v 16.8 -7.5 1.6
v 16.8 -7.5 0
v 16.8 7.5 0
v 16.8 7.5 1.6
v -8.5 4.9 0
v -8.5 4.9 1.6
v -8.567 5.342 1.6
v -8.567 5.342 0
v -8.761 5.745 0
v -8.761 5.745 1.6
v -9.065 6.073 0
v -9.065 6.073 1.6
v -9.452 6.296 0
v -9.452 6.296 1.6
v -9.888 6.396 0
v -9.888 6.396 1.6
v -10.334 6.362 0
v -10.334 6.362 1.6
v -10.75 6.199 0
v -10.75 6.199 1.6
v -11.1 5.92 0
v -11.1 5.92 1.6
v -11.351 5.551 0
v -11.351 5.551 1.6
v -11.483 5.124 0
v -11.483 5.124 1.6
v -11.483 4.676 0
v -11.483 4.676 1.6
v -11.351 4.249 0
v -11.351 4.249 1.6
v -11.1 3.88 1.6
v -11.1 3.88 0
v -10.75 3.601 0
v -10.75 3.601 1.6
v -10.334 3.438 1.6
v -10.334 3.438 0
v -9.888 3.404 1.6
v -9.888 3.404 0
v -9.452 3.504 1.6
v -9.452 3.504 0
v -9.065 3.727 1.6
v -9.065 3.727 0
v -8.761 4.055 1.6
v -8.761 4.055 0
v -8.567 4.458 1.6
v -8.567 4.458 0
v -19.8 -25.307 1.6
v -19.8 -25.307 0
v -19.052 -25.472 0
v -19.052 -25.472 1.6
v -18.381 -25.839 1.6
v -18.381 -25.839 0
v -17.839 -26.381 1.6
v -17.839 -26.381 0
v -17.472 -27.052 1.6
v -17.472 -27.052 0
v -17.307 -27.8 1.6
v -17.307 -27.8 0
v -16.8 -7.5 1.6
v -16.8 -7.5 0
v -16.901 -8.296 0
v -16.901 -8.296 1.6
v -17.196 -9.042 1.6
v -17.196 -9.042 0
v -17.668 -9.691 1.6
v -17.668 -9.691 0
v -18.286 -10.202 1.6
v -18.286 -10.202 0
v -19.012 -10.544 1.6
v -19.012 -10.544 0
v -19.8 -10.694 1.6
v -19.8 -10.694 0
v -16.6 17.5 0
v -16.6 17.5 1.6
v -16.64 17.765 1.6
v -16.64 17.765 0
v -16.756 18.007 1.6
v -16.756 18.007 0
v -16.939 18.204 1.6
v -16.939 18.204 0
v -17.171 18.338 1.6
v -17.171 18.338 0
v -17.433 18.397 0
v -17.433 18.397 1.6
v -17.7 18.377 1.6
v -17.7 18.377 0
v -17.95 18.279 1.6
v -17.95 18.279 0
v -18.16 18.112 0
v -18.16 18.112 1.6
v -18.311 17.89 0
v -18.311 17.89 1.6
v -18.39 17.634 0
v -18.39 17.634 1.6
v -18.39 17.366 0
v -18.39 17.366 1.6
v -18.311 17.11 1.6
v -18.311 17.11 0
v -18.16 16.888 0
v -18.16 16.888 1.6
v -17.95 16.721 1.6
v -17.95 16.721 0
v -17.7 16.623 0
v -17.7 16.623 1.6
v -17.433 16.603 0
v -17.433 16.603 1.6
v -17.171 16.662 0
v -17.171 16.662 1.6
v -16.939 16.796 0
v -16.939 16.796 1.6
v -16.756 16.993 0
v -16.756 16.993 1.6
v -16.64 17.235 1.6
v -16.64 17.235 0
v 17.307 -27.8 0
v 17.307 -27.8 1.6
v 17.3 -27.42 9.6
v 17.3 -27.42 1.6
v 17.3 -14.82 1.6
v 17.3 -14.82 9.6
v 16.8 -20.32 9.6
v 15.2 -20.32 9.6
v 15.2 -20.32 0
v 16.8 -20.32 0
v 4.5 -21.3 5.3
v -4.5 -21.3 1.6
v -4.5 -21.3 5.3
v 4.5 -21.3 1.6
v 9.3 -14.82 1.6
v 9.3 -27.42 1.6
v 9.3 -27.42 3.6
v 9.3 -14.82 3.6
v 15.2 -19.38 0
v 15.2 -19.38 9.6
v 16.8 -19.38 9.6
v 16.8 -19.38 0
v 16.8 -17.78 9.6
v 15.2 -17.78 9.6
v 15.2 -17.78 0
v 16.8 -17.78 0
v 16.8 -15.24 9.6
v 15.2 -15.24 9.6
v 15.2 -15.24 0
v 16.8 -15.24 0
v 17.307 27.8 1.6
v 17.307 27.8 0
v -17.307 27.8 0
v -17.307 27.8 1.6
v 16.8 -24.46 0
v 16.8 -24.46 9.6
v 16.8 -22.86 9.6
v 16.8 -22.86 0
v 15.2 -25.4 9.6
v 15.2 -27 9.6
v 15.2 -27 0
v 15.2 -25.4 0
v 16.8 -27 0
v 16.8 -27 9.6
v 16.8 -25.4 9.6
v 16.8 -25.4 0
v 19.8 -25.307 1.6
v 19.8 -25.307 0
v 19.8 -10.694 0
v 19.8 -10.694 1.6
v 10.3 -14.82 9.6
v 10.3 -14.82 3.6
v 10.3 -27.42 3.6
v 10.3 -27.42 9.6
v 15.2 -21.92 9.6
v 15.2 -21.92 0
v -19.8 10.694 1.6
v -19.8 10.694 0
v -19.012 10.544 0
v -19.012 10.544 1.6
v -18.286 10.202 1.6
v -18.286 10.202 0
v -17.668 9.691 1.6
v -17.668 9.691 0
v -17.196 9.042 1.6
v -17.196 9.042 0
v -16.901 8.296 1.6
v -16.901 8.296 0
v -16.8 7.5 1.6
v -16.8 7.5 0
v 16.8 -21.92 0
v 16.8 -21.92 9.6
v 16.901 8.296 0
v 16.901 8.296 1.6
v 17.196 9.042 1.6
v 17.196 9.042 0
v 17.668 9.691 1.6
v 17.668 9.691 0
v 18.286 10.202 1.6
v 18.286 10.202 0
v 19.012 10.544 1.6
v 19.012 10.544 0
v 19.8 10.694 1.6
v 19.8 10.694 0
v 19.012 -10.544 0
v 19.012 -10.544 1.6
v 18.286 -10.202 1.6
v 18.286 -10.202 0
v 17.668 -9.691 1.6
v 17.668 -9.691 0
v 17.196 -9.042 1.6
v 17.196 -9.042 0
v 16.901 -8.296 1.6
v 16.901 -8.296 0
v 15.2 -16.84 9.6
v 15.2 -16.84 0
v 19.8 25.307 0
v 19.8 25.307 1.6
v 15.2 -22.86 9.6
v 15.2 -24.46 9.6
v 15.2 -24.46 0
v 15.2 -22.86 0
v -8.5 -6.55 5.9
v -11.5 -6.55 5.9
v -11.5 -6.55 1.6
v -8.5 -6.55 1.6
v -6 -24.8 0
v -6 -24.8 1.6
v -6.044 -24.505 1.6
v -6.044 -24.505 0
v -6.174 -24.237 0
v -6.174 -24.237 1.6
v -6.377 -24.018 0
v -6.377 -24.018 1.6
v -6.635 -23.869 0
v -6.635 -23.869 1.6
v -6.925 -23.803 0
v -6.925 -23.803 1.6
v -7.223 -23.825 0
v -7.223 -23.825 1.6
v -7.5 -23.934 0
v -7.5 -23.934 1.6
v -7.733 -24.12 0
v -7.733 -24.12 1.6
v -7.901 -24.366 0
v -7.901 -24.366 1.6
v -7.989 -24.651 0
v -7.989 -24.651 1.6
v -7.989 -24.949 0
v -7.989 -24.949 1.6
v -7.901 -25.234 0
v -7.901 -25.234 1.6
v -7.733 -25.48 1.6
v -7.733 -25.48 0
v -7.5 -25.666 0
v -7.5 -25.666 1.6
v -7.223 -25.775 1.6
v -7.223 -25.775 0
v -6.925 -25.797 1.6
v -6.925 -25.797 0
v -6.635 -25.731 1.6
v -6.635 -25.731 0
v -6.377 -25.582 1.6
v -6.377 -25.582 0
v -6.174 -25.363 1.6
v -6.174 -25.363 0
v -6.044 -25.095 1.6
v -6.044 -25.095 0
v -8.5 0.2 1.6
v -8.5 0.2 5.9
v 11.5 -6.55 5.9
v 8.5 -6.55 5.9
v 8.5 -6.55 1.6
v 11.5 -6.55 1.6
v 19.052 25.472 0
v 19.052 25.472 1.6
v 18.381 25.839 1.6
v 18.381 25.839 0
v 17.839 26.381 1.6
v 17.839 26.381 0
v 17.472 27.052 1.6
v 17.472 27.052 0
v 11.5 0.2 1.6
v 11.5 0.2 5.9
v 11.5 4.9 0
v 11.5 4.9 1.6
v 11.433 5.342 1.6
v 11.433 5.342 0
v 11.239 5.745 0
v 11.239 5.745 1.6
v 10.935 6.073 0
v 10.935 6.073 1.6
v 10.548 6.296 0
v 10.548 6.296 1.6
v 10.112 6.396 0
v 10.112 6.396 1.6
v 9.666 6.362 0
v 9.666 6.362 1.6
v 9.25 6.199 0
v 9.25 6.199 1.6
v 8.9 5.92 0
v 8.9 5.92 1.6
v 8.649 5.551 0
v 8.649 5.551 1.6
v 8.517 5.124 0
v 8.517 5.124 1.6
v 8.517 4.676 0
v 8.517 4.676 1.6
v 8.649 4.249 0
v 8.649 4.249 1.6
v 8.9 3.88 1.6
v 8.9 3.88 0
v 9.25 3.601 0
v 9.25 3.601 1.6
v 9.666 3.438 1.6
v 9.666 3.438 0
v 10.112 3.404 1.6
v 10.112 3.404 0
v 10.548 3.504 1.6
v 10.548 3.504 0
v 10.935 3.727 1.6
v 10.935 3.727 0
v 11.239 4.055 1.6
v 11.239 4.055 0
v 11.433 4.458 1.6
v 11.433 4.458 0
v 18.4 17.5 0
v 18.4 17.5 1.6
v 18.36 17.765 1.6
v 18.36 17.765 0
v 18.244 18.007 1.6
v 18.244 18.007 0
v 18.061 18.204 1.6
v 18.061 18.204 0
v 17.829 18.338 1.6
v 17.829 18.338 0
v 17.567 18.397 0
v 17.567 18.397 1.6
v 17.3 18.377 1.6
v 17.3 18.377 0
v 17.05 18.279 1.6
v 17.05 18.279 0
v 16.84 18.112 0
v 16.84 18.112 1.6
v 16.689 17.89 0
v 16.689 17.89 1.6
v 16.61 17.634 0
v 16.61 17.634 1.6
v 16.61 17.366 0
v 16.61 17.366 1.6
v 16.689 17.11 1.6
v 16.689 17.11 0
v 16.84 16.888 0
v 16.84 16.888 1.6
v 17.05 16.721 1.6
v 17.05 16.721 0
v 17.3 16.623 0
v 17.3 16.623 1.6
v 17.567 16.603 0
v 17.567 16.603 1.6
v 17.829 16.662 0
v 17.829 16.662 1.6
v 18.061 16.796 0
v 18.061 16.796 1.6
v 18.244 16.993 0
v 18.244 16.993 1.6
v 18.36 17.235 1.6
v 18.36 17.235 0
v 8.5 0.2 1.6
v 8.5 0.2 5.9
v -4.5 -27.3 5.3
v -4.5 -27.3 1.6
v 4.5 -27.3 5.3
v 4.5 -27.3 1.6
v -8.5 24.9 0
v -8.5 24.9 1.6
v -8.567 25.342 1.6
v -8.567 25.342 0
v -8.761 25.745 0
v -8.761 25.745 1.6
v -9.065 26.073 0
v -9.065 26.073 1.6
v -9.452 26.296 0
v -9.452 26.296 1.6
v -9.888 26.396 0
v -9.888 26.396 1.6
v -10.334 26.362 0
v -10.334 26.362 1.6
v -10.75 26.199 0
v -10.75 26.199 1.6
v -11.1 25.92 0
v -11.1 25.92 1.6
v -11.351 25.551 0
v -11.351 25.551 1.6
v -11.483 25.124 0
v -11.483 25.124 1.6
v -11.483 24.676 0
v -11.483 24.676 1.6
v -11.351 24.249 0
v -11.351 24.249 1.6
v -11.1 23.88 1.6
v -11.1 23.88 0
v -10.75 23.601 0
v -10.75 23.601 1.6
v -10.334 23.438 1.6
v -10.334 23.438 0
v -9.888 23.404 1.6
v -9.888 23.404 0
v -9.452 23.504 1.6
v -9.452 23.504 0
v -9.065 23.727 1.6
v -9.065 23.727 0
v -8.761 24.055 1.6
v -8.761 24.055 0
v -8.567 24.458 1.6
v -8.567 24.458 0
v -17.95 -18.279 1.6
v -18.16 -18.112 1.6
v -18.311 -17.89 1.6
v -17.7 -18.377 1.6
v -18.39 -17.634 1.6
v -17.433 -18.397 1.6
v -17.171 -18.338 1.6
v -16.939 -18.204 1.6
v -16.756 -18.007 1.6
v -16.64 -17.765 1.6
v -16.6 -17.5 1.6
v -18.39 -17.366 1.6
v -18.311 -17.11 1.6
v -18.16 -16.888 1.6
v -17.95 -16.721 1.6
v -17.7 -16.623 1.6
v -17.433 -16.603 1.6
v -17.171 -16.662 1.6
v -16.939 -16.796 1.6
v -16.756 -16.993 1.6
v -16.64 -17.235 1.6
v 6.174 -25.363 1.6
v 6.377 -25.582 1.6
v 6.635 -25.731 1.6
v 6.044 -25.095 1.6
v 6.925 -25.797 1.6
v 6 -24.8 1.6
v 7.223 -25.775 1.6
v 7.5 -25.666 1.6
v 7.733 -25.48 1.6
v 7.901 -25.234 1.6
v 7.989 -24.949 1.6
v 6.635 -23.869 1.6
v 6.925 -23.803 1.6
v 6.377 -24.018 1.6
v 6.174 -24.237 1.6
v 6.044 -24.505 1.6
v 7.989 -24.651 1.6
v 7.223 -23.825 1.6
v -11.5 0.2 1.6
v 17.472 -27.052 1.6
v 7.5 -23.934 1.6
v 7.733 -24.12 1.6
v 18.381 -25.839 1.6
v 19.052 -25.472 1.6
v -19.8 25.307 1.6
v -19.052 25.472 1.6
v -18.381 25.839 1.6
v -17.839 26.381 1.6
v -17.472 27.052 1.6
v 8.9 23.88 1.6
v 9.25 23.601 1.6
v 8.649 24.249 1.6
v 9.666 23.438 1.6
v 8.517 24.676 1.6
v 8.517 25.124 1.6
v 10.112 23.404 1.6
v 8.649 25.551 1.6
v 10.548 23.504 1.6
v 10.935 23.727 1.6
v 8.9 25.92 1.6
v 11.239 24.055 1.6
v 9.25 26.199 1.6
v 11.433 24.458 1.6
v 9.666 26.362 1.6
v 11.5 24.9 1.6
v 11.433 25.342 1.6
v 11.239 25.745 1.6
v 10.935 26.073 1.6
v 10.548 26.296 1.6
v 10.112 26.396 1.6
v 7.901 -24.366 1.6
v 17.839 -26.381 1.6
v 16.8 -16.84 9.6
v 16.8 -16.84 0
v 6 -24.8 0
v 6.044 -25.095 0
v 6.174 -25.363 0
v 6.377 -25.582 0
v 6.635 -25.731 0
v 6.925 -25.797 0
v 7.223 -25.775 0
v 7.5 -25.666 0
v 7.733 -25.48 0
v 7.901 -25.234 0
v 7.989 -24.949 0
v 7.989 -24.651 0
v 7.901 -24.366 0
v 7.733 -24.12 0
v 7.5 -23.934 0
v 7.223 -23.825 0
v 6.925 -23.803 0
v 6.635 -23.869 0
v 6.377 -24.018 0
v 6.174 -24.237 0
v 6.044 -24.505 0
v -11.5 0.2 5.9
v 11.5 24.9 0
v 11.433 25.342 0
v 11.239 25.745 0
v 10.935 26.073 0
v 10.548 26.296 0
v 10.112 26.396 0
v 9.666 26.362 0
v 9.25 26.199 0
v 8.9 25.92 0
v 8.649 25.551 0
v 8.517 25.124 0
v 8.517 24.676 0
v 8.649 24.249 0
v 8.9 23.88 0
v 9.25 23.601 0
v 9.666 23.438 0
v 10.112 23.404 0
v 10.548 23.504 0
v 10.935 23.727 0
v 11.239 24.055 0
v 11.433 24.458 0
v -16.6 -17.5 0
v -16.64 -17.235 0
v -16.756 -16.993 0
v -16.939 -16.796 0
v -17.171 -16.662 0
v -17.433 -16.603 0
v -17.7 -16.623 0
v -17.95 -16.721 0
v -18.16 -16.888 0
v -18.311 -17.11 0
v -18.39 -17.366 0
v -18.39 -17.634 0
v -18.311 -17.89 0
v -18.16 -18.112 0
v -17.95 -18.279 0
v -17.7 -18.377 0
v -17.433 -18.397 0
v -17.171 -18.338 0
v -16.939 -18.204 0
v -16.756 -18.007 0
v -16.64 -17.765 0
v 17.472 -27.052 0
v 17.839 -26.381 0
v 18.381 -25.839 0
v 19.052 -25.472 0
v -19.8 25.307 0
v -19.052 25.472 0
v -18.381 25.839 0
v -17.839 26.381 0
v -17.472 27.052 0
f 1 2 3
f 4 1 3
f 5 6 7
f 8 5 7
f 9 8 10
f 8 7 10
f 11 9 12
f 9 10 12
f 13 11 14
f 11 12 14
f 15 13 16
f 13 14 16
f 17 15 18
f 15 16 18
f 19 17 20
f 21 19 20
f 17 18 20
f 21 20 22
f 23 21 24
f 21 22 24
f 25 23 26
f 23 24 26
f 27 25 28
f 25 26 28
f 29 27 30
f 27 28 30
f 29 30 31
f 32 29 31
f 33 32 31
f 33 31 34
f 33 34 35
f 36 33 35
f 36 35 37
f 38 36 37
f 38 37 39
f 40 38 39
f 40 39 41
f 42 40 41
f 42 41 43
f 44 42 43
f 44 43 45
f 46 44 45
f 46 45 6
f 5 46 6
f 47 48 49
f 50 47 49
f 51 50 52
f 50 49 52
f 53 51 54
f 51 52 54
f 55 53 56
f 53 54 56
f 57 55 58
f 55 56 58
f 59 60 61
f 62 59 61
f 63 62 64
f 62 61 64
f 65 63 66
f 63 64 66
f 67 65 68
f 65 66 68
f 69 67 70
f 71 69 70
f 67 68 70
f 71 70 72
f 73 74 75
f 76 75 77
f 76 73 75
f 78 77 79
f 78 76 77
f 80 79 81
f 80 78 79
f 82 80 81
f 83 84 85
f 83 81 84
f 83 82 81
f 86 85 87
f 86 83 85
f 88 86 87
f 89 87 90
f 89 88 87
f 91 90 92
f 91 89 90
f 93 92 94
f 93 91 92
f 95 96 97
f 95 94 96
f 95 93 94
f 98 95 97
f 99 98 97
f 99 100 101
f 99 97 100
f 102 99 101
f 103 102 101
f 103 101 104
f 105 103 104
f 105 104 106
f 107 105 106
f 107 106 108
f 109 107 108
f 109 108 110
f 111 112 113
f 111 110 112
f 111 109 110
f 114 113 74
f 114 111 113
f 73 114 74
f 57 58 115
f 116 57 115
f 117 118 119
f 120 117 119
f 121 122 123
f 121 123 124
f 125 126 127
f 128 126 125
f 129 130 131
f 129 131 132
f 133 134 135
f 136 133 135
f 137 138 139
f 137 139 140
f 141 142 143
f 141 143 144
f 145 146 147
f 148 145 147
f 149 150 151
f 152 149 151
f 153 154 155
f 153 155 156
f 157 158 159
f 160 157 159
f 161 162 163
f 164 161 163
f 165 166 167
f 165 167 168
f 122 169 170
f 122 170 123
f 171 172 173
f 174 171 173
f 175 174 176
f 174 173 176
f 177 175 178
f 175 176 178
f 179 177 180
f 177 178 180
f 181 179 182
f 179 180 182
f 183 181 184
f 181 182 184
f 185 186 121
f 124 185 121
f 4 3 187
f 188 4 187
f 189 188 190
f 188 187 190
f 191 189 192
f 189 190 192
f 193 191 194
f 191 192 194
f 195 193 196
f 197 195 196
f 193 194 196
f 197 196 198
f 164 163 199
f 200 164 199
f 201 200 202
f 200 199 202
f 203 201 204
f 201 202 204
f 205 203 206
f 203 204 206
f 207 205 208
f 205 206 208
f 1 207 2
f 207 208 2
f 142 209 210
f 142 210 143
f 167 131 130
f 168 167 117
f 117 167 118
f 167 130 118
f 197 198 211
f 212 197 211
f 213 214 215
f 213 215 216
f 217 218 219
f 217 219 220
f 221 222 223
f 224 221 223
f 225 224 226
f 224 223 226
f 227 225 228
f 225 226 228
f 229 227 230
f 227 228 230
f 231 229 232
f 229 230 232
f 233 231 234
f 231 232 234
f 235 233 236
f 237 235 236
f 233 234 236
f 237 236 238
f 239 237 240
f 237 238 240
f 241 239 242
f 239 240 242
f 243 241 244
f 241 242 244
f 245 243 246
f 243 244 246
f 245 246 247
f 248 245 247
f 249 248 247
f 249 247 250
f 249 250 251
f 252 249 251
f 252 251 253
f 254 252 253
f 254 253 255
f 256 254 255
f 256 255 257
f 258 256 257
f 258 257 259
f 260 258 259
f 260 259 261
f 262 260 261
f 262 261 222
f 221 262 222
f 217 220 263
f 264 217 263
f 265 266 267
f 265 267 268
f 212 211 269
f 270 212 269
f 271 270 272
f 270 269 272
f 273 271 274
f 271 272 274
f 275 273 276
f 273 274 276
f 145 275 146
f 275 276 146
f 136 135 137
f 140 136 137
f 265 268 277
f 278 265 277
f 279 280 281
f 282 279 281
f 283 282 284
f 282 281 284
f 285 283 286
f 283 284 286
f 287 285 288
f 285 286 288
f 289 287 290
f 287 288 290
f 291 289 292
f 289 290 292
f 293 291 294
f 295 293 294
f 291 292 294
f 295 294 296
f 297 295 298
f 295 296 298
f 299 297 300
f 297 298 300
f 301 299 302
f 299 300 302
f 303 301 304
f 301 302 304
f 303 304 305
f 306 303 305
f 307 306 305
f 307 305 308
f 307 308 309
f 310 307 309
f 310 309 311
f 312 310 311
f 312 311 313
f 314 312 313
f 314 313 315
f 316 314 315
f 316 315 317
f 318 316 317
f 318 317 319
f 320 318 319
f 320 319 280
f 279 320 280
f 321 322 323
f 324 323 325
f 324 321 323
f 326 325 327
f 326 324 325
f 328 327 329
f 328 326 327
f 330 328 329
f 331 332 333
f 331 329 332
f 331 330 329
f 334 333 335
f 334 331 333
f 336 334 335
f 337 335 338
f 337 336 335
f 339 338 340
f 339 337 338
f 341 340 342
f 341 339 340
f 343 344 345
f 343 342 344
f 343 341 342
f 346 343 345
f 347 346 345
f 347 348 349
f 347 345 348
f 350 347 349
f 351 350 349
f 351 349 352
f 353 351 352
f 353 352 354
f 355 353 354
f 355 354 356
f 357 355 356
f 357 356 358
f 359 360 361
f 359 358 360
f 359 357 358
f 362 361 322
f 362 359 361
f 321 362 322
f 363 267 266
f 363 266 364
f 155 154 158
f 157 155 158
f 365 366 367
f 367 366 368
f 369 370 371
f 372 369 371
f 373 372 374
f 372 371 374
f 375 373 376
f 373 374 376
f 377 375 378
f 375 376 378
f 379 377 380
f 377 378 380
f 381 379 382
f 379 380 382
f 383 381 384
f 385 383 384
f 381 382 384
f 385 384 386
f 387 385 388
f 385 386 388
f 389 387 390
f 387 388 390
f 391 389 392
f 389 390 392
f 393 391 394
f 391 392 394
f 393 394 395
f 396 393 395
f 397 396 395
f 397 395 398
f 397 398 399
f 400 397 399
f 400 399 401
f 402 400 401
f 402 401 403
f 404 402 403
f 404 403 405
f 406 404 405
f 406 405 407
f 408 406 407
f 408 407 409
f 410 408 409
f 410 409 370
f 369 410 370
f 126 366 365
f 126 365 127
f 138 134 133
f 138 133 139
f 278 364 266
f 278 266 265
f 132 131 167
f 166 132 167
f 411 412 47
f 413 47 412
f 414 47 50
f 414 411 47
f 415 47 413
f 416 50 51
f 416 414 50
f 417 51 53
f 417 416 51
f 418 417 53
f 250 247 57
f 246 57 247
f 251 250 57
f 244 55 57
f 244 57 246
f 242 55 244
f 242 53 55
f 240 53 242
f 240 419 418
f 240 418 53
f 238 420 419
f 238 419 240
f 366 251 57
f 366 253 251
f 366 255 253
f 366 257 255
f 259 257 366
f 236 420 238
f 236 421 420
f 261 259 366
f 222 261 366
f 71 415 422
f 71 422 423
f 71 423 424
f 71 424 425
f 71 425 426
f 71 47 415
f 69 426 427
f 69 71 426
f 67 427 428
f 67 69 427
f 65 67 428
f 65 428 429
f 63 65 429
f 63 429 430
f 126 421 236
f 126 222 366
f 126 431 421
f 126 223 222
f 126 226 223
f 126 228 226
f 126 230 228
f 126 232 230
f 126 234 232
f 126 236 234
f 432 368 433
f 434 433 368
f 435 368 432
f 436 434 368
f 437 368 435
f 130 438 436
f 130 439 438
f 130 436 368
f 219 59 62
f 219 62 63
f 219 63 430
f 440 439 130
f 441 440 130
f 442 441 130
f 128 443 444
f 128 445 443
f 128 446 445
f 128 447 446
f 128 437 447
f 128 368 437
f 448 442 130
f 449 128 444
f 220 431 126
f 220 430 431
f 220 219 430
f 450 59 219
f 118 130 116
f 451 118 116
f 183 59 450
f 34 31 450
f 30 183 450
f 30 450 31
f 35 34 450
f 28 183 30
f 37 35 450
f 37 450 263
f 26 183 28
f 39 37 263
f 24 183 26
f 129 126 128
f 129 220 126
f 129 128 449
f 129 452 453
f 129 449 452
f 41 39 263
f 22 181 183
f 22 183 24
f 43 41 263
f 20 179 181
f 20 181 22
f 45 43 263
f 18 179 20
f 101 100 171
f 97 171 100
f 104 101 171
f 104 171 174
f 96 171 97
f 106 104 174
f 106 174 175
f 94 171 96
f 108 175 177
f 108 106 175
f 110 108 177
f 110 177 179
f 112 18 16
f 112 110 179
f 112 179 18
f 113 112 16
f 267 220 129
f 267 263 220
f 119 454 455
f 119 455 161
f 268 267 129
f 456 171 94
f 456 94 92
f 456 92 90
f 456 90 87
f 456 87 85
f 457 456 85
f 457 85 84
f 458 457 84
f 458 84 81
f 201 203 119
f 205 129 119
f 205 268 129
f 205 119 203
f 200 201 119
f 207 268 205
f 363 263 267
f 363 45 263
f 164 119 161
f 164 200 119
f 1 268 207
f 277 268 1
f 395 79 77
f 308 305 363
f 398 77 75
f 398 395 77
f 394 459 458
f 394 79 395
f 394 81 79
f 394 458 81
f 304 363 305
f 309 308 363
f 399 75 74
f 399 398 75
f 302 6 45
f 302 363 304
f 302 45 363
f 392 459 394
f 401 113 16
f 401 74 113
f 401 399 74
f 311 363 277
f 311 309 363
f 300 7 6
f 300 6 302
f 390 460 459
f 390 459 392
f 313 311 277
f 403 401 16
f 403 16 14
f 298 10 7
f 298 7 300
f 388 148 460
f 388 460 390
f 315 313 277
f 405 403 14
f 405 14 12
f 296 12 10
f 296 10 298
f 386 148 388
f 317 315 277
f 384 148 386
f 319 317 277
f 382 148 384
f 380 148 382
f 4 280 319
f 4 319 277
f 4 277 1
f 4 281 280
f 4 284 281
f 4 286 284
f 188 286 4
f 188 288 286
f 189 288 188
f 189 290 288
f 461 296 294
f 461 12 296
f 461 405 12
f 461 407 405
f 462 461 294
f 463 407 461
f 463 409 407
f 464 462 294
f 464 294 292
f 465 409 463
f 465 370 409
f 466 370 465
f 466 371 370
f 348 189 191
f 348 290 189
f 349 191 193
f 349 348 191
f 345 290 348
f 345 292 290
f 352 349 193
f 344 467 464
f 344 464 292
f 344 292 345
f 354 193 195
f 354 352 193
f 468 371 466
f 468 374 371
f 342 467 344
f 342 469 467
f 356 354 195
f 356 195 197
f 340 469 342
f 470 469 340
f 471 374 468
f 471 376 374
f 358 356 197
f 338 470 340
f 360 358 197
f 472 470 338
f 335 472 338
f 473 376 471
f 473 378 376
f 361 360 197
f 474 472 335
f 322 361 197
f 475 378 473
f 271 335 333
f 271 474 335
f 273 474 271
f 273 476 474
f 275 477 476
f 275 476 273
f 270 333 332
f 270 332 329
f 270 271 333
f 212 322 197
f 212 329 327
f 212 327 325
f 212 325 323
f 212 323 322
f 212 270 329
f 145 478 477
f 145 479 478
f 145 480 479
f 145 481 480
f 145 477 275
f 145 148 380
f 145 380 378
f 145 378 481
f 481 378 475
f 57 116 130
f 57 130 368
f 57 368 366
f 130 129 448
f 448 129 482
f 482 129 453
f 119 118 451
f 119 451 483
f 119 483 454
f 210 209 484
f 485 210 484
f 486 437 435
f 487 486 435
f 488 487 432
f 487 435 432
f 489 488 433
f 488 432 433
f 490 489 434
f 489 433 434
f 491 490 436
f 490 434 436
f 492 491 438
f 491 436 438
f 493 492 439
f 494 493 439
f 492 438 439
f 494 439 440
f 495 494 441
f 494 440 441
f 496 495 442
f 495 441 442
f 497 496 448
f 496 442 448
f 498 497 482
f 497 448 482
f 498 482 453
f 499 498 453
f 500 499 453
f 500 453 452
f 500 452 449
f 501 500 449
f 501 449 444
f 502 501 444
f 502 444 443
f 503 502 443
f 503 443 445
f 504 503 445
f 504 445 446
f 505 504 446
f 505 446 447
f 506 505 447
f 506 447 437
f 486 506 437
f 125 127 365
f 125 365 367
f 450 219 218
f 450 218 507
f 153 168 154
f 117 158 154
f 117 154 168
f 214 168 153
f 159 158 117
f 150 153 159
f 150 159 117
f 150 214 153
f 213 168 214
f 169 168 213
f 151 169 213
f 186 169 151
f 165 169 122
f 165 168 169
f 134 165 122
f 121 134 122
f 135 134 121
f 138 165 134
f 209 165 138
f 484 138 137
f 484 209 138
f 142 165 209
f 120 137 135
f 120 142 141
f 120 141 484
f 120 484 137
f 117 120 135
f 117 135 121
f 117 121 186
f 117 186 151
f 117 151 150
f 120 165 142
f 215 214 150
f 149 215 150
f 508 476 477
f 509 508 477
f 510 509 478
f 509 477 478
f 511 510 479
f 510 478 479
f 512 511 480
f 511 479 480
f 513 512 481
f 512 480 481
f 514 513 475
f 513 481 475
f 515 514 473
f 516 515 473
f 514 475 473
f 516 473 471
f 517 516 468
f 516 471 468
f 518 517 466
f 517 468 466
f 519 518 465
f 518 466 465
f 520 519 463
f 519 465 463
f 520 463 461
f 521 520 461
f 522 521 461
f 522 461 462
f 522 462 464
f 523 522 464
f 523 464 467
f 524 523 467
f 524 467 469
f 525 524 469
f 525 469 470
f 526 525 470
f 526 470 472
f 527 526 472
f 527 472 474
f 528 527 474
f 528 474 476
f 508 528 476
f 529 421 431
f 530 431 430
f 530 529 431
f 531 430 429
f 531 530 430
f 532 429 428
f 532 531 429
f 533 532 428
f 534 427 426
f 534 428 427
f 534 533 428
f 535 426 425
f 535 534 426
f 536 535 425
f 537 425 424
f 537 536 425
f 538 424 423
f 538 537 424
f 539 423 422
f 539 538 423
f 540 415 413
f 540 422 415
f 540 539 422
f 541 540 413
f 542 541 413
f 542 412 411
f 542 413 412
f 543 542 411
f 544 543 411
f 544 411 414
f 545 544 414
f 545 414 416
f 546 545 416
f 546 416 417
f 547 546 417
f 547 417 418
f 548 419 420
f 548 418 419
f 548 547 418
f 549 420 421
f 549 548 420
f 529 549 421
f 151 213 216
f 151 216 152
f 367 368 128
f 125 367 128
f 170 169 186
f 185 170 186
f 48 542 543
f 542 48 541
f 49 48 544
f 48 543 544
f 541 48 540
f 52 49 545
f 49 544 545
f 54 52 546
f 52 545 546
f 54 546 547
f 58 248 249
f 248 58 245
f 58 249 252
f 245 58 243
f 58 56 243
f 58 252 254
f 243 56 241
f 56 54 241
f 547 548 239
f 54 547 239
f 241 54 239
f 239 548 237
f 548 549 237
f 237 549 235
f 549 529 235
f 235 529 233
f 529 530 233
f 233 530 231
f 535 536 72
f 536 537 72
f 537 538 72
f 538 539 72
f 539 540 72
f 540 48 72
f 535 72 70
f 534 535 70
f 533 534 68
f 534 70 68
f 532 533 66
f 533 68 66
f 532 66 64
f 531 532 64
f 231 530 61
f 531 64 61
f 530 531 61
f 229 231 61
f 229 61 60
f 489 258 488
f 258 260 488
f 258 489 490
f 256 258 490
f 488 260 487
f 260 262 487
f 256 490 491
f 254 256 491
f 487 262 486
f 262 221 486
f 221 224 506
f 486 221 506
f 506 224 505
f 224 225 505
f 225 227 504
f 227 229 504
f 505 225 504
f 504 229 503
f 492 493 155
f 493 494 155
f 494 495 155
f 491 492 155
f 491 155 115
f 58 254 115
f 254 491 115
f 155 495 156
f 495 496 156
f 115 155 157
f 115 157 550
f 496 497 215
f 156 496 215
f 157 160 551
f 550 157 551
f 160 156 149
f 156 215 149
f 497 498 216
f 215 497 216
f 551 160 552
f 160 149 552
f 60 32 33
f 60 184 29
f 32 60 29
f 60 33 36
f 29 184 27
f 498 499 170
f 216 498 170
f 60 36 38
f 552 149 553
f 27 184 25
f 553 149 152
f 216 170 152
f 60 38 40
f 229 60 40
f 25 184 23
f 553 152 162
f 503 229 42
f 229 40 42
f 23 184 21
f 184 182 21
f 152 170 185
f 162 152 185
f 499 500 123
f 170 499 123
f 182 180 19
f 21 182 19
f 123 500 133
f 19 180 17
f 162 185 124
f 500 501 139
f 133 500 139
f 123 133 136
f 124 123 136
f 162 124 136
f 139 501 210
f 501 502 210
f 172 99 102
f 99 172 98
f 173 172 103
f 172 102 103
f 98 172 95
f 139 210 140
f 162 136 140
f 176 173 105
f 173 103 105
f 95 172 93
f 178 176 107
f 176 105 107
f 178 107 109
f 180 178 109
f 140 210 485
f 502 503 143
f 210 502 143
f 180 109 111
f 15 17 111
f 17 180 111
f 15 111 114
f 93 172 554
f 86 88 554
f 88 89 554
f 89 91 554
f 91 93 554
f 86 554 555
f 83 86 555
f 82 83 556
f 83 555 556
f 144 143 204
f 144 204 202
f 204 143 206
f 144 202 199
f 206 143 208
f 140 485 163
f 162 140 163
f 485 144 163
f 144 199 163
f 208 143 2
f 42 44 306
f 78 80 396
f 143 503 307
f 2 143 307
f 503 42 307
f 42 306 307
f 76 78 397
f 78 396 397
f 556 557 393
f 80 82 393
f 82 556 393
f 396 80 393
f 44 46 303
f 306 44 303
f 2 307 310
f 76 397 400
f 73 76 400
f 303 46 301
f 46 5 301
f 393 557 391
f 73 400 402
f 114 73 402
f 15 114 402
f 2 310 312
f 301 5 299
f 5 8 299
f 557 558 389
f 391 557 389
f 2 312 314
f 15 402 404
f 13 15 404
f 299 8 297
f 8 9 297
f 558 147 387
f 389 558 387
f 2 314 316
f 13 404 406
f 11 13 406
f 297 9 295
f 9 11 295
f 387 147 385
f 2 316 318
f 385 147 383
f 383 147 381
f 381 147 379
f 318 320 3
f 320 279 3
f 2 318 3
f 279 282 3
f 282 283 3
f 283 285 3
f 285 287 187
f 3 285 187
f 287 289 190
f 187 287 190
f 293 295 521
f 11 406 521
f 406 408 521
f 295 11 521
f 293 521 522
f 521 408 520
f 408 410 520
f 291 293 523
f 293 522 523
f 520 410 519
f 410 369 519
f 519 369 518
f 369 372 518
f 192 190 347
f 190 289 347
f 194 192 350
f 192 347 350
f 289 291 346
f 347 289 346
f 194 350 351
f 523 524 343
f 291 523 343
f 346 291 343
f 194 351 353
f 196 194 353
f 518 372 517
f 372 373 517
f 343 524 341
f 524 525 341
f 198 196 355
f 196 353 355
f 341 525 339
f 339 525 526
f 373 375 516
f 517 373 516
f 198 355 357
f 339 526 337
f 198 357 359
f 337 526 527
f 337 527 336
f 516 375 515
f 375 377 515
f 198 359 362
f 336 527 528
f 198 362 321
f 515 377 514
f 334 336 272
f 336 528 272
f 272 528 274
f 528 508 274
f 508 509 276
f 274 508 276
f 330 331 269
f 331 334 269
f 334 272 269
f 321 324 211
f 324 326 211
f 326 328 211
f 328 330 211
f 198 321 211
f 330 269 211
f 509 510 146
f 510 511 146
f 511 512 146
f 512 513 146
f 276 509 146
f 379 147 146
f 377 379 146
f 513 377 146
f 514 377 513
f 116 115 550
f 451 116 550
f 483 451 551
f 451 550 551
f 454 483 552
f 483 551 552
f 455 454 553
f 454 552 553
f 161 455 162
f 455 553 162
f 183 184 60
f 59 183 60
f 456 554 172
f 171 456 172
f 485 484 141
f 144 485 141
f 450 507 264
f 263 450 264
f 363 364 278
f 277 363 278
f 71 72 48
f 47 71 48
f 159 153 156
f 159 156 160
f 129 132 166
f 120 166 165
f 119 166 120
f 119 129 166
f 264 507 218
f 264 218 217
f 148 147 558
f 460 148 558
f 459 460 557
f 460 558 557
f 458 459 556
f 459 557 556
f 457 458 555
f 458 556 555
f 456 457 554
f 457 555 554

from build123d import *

# Parameters (mm, degrees)
EXTRUDE_1_DEPTH     = 1.6
SKETCH_2_3_R        = 0.9
SKETCH_2_3_W        = 1.6
SKETCH_2_3_H        = 1.6
CUT_EXTRUDE_4_DEPTH = 35.167821119
SKETCH_3_W          = 9
SKETCH_3_H          = 6
EXTRUDE_2_DEPTH     = 3.7
SKETCH_4_R          = 1.5
CUT_EXTRUDE_5_DEPTH = 35.33030731
SKETCH_8_W          = 8
SKETCH_8_H          = 12.6
SKETCH_8_W_2        = 1.6
SKETCH_8_H_2        = 1.6
EXTRUDE_7_DEPTH     = 8
SKETCH_9_W          = 3
SKETCH_9_H          = 6.75
EXTRUDE_9_DEPTH     = 4.3
SKETCH_10_R         = 1
CUT_EXTRUDE_6_DEPTH = 36.05538475
SKETCH_11_W         = 1
SKETCH_11_H         = 6
CUT_EXTRUDE_7_DEPTH = 12.6


with BuildPart() as part:
    # 草图2 → 凸台-拉伸1 (new body)
    with BuildSketch(Plane.XY):
        with BuildLine():
            Line((19.8, 10.693743885), (19.8, 25.307417596))
            ThreePointArc((19.8, 25.307417596), (18.090811691, 26.090811691), (17.307417596, 27.8))
            Line((17.307417596, 27.8), (-17.307417596, 27.8))
            ThreePointArc((-17.307417596, 27.8), (-18.090811691, 26.090811691), (-19.8, 25.307417596))
            Line((-19.8, 25.307417596), (-19.8, 10.693743885))
            ThreePointArc((-19.8, 10.693743885), (-17.667619242, 9.69089023), (-16.8, 7.5))
            Line((-16.8, 7.5), (-16.8, -7.5))
            ThreePointArc((-16.8, -7.5), (-17.667619242, -9.69089023), (-19.8, -10.693743885))
            Line((-19.8, -10.693743885), (-19.8, -25.307417596))
            ThreePointArc((-19.8, -25.307417596), (-18.090811691, -26.090811691), (-17.307417596, -27.8))
            Line((-17.307417596, -27.8), (17.307417596, -27.8))
            ThreePointArc((17.307417596, -27.8), (18.090811691, -26.090811691), (19.8, -25.307417596))
            Line((19.8, -25.307417596), (19.8, -10.693743885))
            ThreePointArc((19.8, -10.693743885), (17.667619242, -9.69089023), (16.8, -7.5))
            Line((16.8, -7.5), (16.8, 7.5))
            ThreePointArc((16.8, 7.5), (17.667619242, 9.69089023), (19.8, 10.693743885))
        make_face()
    extrude(amount=EXTRUDE_1_DEPTH)

    # 草图2<3> → 切除-拉伸4 (cut, through all)
    with BuildSketch(Plane.XY):
        with Locations((17.5, 17.5)):
            Circle(SKETCH_2_3_R)
        with Locations((-17.5, 17.5)):
            Circle(SKETCH_2_3_R)
        with Locations((-17.5, -17.5)):
            Circle(SKETCH_2_3_R)
        with Locations((16, -16.04)):
            Rectangle(SKETCH_2_3_W, SKETCH_2_3_H)
        with Locations((16, -18.58)):
            Rectangle(SKETCH_2_3_W, SKETCH_2_3_H)
        with Locations((16, -21.12)):
            Rectangle(SKETCH_2_3_W, SKETCH_2_3_H)
        with Locations((16, -23.66)):
            Rectangle(SKETCH_2_3_W, SKETCH_2_3_H)
        with Locations((16, -26.2)):
            Rectangle(SKETCH_2_3_W, SKETCH_2_3_H)
    extrude(amount=CUT_EXTRUDE_4_DEPTH, mode=Mode.SUBTRACT)

    # 草图3 → 凸台-拉伸2 (add)
    with BuildSketch(Plane.XY.offset(1.6)):
        with Locations((0, -24.3)):
            Rectangle(SKETCH_3_W, SKETCH_3_H)
    extrude(amount=EXTRUDE_2_DEPTH)

    # 草图4 → 切除-拉伸5 (cut, through all)
    with BuildSketch(Plane.XY.offset(1.6)):
        with Locations((-10, 24.9)):
            Circle(SKETCH_4_R)
        with Locations((10, 24.9)):
            Circle(SKETCH_4_R)
        with Locations((-10, 4.9)):
            Circle(SKETCH_4_R)
        with Locations((10, 4.9)):
            Circle(SKETCH_4_R)
    extrude(amount=-CUT_EXTRUDE_5_DEPTH, mode=Mode.SUBTRACT)

    # 草图8 → 凸台-拉伸7 (add)
    with BuildSketch(Plane.XY.offset(1.6)):
        with Locations((13.3, -21.12)):
            Rectangle(SKETCH_8_W, SKETCH_8_H)
        with Locations((16, -26.2)):
            Rectangle(SKETCH_8_W_2, SKETCH_8_H_2, mode=Mode.SUBTRACT)
        with Locations((16, -23.66)):
            Rectangle(SKETCH_8_W_2, SKETCH_8_H_2, mode=Mode.SUBTRACT)
        with Locations((16, -21.12)):
            Rectangle(SKETCH_8_W_2, SKETCH_8_H_2, mode=Mode.SUBTRACT)
        with Locations((16, -18.58)):
            Rectangle(SKETCH_8_W_2, SKETCH_8_H_2, mode=Mode.SUBTRACT)
        with Locations((16, -16.04)):
            Rectangle(SKETCH_8_W_2, SKETCH_8_H_2, mode=Mode.SUBTRACT)
    extrude(amount=EXTRUDE_7_DEPTH)

    # 草图9 → 凸台-拉伸9 (add)
    with BuildSketch(Plane.XY.offset(1.6)):
        with Locations((-10, -3.175)):
            Rectangle(SKETCH_9_W, SKETCH_9_H)
        with Locations((10, -3.175)):
            Rectangle(SKETCH_9_W, SKETCH_9_H)
    extrude(amount=EXTRUDE_9_DEPTH)

    # 草图10 → 切除-拉伸6 (cut, through all)
    with BuildSketch(Plane.XY.offset(1.6)):
        with Locations((-7, -24.8)):
            Circle(SKETCH_10_R)
        with Locations(Location((7, -24.8, 0), (0, 0, 180))):
            Circle(SKETCH_10_R)
    extrude(amount=-CUT_EXTRUDE_6_DEPTH, mode=Mode.SUBTRACT)

    # 草图11 → 切除-拉伸7 (cut)
    with BuildSketch(Plane.XZ.offset(27.42)):
        with Locations((9.8, 6.6)):
            Rectangle(SKETCH_11_W, SKETCH_11_H)
    extrude(amount=-CUT_EXTRUDE_7_DEPTH, mode=Mode.SUBTRACT)


solid = part.part
